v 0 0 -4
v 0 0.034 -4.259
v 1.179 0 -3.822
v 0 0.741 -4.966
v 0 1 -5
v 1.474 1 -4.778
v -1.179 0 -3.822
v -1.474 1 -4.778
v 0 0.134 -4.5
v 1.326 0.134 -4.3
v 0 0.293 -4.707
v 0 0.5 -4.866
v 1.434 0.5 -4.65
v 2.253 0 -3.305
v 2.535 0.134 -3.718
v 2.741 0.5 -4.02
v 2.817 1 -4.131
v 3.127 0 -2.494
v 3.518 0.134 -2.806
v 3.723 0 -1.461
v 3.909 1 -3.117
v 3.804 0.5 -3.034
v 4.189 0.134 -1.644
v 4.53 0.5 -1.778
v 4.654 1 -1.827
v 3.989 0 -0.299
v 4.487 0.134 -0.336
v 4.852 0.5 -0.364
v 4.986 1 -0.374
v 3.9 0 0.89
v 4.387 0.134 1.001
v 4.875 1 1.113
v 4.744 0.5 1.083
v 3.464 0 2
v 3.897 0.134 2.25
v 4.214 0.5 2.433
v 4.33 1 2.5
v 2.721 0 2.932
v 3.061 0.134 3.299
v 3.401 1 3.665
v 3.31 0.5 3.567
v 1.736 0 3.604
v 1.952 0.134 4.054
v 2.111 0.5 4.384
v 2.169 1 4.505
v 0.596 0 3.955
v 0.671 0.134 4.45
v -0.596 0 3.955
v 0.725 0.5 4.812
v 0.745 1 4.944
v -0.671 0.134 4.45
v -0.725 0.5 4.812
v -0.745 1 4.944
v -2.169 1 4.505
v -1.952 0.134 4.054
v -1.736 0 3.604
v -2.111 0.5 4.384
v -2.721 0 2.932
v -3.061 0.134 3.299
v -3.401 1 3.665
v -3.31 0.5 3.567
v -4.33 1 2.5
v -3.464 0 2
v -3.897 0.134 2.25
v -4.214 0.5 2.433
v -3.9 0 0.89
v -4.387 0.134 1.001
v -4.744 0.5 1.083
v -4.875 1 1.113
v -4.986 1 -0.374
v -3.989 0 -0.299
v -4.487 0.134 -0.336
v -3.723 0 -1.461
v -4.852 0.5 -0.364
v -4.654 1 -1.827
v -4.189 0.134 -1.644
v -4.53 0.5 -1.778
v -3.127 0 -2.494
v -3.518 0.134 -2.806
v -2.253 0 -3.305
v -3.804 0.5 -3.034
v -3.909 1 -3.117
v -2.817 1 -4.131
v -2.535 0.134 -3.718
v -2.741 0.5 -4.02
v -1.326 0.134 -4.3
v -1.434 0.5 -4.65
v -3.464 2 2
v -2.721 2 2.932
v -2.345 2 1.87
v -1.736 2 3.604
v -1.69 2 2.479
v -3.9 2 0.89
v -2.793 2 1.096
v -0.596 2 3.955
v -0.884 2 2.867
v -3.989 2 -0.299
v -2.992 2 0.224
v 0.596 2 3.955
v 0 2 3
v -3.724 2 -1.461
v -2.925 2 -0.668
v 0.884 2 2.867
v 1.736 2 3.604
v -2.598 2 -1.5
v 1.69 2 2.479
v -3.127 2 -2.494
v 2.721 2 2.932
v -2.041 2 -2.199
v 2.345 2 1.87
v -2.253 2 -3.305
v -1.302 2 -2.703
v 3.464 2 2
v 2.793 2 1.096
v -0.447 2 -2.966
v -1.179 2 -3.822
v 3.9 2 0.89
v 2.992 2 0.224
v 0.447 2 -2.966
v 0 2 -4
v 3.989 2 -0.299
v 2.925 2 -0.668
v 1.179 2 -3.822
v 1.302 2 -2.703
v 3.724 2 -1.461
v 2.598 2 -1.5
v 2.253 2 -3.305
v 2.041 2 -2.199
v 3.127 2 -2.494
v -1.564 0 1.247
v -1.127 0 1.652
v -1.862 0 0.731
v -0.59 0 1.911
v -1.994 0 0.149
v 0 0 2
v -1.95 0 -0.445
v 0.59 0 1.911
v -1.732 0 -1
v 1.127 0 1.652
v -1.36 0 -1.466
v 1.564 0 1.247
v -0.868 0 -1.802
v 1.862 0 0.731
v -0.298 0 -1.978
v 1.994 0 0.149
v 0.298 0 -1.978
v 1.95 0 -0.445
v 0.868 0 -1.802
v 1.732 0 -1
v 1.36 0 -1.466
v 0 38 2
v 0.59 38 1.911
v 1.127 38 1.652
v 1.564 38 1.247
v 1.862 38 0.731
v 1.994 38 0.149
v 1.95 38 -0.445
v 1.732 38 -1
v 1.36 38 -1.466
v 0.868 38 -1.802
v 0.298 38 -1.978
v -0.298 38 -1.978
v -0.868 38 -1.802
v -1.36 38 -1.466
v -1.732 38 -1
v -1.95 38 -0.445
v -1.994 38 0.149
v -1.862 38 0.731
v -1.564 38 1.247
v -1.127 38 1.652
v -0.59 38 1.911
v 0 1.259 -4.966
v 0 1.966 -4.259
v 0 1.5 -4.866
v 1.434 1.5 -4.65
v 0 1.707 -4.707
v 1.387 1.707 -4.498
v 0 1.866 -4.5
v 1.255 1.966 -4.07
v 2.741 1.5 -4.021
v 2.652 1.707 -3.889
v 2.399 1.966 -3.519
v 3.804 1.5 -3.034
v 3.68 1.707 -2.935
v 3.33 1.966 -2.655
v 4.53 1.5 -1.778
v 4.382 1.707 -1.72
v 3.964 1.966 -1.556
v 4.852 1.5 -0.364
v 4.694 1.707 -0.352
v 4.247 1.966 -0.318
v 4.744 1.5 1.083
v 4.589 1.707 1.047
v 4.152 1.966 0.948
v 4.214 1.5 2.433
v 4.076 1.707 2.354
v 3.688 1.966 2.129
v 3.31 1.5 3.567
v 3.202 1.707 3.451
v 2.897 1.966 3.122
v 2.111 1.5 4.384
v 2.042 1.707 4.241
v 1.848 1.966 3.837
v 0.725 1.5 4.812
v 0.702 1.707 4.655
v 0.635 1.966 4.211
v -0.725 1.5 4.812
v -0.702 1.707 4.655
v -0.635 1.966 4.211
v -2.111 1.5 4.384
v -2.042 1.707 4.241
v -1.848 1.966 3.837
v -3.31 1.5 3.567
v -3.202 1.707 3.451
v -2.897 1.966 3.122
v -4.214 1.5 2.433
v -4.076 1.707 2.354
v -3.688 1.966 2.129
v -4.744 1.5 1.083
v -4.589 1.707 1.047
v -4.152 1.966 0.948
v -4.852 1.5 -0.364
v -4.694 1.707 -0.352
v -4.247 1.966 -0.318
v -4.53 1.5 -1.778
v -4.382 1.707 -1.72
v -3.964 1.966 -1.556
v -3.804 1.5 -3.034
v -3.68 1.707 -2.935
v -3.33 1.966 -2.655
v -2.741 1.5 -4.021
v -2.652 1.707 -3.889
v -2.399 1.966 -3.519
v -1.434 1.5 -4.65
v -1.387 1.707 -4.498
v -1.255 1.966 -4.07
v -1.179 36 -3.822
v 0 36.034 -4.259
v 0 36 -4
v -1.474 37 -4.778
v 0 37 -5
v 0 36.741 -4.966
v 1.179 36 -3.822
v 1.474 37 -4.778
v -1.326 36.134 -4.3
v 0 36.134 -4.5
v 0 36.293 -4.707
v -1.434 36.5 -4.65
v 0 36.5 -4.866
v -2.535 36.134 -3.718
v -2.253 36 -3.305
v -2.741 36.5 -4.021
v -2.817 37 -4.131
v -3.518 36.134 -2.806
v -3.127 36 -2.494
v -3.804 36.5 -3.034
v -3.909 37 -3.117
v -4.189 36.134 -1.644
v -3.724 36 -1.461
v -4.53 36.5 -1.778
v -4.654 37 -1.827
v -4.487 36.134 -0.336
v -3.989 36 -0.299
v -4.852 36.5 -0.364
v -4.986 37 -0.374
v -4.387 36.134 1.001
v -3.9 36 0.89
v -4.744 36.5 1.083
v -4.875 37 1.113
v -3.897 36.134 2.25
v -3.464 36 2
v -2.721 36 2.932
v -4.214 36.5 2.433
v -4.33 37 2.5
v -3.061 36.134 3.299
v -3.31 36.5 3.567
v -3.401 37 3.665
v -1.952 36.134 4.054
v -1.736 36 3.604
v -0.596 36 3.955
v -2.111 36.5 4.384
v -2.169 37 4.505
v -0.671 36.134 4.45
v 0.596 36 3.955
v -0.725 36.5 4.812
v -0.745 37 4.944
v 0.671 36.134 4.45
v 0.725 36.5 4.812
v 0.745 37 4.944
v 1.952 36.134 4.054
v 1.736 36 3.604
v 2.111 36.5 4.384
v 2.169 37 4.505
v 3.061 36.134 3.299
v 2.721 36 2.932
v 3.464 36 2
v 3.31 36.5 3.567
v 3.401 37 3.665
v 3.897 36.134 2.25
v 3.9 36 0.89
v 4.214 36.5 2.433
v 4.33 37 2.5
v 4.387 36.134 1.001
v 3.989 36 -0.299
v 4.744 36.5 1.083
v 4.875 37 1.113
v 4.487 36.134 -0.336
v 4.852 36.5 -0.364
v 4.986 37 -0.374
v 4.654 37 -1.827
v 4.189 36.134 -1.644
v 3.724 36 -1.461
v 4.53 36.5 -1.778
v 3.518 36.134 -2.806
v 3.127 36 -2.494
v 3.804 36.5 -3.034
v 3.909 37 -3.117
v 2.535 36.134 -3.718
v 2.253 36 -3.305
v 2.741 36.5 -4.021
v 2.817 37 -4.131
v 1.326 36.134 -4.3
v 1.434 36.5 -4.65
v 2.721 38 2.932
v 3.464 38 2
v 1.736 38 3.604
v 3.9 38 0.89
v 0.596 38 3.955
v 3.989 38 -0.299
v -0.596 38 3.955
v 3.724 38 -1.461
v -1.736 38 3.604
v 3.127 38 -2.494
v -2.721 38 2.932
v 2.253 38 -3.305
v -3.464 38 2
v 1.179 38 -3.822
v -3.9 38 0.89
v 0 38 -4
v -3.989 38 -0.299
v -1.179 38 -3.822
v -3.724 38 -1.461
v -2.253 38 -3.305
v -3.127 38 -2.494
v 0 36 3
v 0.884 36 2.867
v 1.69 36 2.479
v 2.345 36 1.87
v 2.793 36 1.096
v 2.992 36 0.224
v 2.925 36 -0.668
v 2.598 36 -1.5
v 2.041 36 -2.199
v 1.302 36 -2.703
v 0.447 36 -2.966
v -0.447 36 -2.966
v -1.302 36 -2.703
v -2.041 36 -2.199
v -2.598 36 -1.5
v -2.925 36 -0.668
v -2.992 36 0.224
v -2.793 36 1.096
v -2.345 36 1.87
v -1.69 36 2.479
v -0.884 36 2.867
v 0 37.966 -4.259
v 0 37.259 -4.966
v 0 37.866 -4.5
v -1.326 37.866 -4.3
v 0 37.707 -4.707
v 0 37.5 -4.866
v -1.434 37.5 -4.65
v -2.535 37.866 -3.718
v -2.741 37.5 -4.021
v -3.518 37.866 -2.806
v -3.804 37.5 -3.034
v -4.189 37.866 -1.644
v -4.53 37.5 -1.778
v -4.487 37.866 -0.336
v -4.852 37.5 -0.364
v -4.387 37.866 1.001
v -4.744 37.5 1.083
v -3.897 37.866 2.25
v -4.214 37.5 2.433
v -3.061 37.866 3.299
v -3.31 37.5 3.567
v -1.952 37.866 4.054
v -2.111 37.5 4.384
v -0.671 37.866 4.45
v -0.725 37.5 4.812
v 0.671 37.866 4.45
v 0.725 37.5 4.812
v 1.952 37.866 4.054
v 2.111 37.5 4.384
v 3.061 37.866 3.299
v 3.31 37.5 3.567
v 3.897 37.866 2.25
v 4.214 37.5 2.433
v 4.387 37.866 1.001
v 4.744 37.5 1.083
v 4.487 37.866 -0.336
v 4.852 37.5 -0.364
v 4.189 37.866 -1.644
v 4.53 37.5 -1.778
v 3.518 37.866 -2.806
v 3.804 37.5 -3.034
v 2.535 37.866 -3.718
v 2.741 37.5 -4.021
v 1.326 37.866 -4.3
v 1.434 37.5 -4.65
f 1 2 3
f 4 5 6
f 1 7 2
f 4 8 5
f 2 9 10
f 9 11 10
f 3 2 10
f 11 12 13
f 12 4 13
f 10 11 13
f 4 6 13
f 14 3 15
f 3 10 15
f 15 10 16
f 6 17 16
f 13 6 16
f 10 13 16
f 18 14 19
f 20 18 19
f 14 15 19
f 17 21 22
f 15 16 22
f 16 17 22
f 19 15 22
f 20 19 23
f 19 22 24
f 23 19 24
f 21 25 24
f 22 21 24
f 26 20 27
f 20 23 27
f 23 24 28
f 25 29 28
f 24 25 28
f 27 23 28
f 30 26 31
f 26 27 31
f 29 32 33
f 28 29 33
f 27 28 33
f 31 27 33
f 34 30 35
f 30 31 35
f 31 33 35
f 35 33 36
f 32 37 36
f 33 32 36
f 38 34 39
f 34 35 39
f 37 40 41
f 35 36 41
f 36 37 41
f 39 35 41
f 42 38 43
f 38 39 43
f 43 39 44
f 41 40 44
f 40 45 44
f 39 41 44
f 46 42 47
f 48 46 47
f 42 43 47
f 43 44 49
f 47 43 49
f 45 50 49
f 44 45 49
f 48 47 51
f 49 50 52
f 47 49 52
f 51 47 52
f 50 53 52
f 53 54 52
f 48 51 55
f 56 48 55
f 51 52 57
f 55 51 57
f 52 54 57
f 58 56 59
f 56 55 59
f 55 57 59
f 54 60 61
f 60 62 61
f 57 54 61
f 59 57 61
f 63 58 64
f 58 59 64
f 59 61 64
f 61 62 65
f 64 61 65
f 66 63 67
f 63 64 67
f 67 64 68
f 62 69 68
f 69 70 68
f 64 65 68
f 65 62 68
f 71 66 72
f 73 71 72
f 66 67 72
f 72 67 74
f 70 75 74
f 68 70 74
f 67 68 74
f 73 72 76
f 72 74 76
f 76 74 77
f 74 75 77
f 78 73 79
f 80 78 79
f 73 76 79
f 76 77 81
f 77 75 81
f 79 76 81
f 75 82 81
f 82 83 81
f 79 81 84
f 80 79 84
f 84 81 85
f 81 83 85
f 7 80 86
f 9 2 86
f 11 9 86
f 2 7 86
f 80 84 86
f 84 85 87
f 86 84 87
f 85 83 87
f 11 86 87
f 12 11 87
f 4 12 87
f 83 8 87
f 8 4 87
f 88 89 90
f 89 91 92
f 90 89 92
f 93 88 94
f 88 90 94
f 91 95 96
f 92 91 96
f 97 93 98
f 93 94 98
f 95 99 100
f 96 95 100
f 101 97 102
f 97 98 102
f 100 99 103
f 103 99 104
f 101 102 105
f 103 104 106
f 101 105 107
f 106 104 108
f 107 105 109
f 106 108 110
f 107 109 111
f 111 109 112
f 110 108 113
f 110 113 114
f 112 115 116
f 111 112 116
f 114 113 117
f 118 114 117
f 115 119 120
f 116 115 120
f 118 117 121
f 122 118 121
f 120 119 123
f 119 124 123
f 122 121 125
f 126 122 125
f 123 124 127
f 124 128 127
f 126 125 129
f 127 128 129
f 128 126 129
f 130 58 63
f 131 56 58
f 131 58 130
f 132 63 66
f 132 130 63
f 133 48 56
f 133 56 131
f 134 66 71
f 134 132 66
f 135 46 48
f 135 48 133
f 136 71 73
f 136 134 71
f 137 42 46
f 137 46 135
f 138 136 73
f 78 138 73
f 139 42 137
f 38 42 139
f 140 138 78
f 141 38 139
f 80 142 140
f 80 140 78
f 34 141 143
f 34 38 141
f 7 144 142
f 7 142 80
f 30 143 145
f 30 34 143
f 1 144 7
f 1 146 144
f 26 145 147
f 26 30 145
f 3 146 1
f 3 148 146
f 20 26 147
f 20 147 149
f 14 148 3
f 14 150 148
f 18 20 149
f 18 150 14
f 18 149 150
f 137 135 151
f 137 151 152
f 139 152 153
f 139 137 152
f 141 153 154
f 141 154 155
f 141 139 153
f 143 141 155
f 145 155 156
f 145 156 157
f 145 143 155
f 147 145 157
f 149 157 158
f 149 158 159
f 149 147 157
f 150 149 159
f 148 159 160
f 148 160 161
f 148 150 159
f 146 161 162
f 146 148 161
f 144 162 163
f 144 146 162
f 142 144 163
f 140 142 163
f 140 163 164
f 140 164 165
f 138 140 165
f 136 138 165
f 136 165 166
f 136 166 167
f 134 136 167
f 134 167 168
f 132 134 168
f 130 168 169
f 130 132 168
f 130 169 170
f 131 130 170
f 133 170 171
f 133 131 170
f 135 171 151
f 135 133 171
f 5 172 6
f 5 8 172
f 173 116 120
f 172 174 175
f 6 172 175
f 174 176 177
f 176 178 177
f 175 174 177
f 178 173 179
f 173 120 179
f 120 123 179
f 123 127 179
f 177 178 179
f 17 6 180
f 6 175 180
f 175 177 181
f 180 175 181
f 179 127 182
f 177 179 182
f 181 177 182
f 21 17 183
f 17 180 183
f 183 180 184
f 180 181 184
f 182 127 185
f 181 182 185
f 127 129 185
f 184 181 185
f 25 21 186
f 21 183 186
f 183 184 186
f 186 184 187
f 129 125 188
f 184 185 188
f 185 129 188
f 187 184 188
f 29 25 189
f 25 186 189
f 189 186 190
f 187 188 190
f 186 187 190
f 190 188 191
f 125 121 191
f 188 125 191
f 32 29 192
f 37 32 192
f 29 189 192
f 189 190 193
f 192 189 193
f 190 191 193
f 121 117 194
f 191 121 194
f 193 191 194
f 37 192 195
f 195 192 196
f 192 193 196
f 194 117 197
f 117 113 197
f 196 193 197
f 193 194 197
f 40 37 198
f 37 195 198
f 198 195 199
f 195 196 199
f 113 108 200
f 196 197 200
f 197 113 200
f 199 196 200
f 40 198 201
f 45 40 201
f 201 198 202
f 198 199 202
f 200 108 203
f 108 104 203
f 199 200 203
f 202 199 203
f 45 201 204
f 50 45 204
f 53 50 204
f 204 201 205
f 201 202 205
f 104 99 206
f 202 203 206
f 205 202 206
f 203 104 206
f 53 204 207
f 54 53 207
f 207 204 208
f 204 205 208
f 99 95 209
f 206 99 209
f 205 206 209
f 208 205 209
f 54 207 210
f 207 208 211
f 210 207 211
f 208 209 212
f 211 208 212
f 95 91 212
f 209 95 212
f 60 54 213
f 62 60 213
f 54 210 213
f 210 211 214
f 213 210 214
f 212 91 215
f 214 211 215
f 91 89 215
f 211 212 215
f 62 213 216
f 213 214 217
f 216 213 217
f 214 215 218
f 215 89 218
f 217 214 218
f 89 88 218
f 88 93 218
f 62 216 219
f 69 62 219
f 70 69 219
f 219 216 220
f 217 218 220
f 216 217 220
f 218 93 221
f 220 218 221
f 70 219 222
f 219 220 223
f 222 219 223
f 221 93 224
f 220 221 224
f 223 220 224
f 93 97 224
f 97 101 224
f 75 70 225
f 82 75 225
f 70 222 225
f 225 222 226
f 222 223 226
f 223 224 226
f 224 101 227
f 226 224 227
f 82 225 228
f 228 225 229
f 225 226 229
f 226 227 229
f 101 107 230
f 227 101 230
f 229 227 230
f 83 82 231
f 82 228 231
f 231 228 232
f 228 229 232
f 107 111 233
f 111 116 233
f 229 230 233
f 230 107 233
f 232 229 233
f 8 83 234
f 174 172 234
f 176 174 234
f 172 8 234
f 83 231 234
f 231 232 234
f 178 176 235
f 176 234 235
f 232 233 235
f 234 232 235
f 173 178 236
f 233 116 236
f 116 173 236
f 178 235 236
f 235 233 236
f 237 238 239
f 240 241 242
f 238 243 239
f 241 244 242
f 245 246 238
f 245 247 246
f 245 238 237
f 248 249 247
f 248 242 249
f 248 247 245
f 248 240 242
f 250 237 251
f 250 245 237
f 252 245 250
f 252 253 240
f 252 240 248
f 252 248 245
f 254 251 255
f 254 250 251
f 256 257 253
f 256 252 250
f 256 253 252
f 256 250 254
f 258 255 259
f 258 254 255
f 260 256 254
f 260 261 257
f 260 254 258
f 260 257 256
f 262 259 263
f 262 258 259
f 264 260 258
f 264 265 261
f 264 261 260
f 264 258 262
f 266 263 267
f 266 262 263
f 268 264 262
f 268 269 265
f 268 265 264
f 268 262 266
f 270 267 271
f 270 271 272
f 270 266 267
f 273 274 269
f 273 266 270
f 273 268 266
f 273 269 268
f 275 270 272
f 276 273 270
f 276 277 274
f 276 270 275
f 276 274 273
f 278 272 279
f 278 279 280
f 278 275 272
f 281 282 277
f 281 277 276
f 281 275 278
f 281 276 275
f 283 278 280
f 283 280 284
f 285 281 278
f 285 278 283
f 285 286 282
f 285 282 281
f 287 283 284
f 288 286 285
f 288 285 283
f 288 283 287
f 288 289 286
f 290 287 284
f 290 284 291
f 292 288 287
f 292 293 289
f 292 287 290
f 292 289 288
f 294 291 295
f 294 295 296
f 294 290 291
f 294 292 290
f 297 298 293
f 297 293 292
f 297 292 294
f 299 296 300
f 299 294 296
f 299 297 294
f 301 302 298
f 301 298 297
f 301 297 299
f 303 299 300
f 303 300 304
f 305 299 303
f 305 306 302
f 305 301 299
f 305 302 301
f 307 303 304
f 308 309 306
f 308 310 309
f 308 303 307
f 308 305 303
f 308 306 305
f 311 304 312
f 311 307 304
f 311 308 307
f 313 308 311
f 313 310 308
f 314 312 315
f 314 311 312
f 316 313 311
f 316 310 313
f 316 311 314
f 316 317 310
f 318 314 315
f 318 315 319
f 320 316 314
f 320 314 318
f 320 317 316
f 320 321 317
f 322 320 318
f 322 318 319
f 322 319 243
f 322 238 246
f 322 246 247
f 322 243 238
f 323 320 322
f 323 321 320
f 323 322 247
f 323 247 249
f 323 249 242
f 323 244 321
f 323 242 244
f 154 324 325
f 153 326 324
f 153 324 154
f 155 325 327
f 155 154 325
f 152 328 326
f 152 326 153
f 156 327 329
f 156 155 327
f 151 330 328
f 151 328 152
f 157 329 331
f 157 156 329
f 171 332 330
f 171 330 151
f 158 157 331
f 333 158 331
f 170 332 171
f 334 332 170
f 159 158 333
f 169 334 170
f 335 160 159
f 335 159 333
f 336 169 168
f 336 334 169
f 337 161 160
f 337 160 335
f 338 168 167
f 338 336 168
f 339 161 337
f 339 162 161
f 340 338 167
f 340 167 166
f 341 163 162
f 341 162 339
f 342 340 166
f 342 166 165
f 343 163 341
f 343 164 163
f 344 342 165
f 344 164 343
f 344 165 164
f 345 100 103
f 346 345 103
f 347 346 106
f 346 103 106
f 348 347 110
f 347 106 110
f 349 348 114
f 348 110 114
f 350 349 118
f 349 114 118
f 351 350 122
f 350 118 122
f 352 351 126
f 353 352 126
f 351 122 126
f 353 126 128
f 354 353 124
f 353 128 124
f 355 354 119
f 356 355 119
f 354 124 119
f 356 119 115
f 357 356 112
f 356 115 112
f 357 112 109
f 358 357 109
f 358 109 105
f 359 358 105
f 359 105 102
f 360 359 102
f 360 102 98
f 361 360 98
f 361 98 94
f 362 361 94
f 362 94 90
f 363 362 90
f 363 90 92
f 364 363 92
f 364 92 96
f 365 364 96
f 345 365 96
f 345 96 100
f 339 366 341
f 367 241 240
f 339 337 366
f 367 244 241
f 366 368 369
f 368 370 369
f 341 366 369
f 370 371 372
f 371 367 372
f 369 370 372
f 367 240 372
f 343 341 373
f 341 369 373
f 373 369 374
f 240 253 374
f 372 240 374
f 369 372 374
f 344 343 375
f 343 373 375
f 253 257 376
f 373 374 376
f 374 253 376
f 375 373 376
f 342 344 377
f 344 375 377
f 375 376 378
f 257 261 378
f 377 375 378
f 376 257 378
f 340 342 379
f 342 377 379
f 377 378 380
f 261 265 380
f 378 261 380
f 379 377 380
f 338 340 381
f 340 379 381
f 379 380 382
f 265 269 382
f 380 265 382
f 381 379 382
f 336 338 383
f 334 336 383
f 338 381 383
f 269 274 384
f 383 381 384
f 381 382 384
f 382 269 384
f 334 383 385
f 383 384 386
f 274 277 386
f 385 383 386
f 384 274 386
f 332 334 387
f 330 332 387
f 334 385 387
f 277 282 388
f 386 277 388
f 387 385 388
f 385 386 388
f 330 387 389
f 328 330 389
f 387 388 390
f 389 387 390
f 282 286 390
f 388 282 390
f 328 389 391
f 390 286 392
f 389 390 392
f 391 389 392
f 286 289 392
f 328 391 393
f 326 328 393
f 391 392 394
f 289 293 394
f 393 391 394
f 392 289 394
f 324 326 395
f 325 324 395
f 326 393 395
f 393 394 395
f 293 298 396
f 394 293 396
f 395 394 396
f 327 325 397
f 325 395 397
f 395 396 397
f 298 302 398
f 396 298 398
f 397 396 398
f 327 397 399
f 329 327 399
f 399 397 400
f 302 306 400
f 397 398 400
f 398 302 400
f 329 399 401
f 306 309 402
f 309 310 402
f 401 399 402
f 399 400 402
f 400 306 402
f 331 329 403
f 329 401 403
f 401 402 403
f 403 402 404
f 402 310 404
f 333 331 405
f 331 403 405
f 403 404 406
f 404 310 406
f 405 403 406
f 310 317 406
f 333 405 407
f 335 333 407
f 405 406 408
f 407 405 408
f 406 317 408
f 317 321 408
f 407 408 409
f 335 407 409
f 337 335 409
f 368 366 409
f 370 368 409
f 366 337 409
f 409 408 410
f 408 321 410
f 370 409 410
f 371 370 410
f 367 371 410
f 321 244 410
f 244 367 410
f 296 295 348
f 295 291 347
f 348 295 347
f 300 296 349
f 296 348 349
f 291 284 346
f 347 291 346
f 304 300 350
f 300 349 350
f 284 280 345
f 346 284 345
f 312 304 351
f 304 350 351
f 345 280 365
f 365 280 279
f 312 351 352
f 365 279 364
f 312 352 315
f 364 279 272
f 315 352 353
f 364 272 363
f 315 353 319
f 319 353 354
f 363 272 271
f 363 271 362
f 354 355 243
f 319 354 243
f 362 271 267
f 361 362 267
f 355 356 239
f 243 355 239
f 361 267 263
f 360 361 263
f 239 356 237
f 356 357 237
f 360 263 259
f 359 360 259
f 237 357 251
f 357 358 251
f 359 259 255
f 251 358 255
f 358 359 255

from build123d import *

# Parameters (mm, degrees)
SKETCH1_R           = 3
SKETCH1_R_2         = 2
BOSS_EXTRUDE1_DEPTH = 38
SKETCH2_R           = 5
SKETCH2_R_2         = 3
BOSS_EXTRUDE2_DEPTH = 2
BOSS_EXTRUDE3_START = -2
SKETCH3_R           = 5
SKETCH3_R_2         = 3
BOSS_EXTRUDE3_DEPTH = 2
FILLET4_R           = 1
FILLET5_R           = 1
FILLET6_R           = 1


with BuildPart() as part:
    # Sketch1 → Boss-Extrude1 (new body)
    with BuildSketch(Plane(origin=(0, 0, 0), x_dir=(1, 0, 0), z_dir=(0, 1, 0))):
        with Locations(Location((0, 0, 0), (0, 0, 270))):
            Circle(SKETCH1_R)
        with Locations(Location((0, 0, 0), (0, 0, 270))):
            Circle(SKETCH1_R_2, mode=Mode.SUBTRACT)
    extrude(amount=BOSS_EXTRUDE1_DEPTH)

    # Sketch2 → Boss-Extrude2 (add)
    with BuildSketch(Plane.XZ):
        with Locations(Location((0, 0, 0), (0, 0, 270))):
            Circle(SKETCH2_R)
        with Locations(Location((0, 0, 0), (0, 0, 270))):
            Circle(SKETCH2_R_2, mode=Mode.SUBTRACT)
    extrude(amount=-BOSS_EXTRUDE2_DEPTH)

    # Sketch3 → Boss-Extrude3 (add)
    with BuildSketch(Plane(origin=(0, 38, 0), x_dir=(1, 0, 0), z_dir=(0, 1, 0)).offset(BOSS_EXTRUDE3_START)):
        with Locations(Location((0, 0, 0), (0, 0, 90))):
            Circle(SKETCH3_R)
        with Locations(Location((0, 0, 0), (0, 0, 90))):
            Circle(SKETCH3_R_2, mode=Mode.SUBTRACT)
    extrude(amount=BOSS_EXTRUDE3_DEPTH)

    # Fillet4
    fillet4_edges = [part.edges().sort_by_distance(p)[0] for p in [
        (0, 0, 5),
    ]]
    fillet(fillet4_edges, radius=FILLET4_R)

    # Fillet5
    fillet5_edges = [part.edges().sort_by_distance(p)[0] for p in [
        (0, 2, 5),
    ]]
    fillet(fillet5_edges, radius=FILLET5_R - 0.0001)  # a hair under: the kernel refuses the full size

    # Fillet6
    fillet6_edges = [part.edges().sort_by_distance(p)[0] for p in [
        (0, 36, 5),
        (0, 38, 5),
    ]]
    fillet(fillet6_edges, radius=FILLET6_R - 0.0001)  # a hair under: the kernel refuses the full size


solid = part.part
